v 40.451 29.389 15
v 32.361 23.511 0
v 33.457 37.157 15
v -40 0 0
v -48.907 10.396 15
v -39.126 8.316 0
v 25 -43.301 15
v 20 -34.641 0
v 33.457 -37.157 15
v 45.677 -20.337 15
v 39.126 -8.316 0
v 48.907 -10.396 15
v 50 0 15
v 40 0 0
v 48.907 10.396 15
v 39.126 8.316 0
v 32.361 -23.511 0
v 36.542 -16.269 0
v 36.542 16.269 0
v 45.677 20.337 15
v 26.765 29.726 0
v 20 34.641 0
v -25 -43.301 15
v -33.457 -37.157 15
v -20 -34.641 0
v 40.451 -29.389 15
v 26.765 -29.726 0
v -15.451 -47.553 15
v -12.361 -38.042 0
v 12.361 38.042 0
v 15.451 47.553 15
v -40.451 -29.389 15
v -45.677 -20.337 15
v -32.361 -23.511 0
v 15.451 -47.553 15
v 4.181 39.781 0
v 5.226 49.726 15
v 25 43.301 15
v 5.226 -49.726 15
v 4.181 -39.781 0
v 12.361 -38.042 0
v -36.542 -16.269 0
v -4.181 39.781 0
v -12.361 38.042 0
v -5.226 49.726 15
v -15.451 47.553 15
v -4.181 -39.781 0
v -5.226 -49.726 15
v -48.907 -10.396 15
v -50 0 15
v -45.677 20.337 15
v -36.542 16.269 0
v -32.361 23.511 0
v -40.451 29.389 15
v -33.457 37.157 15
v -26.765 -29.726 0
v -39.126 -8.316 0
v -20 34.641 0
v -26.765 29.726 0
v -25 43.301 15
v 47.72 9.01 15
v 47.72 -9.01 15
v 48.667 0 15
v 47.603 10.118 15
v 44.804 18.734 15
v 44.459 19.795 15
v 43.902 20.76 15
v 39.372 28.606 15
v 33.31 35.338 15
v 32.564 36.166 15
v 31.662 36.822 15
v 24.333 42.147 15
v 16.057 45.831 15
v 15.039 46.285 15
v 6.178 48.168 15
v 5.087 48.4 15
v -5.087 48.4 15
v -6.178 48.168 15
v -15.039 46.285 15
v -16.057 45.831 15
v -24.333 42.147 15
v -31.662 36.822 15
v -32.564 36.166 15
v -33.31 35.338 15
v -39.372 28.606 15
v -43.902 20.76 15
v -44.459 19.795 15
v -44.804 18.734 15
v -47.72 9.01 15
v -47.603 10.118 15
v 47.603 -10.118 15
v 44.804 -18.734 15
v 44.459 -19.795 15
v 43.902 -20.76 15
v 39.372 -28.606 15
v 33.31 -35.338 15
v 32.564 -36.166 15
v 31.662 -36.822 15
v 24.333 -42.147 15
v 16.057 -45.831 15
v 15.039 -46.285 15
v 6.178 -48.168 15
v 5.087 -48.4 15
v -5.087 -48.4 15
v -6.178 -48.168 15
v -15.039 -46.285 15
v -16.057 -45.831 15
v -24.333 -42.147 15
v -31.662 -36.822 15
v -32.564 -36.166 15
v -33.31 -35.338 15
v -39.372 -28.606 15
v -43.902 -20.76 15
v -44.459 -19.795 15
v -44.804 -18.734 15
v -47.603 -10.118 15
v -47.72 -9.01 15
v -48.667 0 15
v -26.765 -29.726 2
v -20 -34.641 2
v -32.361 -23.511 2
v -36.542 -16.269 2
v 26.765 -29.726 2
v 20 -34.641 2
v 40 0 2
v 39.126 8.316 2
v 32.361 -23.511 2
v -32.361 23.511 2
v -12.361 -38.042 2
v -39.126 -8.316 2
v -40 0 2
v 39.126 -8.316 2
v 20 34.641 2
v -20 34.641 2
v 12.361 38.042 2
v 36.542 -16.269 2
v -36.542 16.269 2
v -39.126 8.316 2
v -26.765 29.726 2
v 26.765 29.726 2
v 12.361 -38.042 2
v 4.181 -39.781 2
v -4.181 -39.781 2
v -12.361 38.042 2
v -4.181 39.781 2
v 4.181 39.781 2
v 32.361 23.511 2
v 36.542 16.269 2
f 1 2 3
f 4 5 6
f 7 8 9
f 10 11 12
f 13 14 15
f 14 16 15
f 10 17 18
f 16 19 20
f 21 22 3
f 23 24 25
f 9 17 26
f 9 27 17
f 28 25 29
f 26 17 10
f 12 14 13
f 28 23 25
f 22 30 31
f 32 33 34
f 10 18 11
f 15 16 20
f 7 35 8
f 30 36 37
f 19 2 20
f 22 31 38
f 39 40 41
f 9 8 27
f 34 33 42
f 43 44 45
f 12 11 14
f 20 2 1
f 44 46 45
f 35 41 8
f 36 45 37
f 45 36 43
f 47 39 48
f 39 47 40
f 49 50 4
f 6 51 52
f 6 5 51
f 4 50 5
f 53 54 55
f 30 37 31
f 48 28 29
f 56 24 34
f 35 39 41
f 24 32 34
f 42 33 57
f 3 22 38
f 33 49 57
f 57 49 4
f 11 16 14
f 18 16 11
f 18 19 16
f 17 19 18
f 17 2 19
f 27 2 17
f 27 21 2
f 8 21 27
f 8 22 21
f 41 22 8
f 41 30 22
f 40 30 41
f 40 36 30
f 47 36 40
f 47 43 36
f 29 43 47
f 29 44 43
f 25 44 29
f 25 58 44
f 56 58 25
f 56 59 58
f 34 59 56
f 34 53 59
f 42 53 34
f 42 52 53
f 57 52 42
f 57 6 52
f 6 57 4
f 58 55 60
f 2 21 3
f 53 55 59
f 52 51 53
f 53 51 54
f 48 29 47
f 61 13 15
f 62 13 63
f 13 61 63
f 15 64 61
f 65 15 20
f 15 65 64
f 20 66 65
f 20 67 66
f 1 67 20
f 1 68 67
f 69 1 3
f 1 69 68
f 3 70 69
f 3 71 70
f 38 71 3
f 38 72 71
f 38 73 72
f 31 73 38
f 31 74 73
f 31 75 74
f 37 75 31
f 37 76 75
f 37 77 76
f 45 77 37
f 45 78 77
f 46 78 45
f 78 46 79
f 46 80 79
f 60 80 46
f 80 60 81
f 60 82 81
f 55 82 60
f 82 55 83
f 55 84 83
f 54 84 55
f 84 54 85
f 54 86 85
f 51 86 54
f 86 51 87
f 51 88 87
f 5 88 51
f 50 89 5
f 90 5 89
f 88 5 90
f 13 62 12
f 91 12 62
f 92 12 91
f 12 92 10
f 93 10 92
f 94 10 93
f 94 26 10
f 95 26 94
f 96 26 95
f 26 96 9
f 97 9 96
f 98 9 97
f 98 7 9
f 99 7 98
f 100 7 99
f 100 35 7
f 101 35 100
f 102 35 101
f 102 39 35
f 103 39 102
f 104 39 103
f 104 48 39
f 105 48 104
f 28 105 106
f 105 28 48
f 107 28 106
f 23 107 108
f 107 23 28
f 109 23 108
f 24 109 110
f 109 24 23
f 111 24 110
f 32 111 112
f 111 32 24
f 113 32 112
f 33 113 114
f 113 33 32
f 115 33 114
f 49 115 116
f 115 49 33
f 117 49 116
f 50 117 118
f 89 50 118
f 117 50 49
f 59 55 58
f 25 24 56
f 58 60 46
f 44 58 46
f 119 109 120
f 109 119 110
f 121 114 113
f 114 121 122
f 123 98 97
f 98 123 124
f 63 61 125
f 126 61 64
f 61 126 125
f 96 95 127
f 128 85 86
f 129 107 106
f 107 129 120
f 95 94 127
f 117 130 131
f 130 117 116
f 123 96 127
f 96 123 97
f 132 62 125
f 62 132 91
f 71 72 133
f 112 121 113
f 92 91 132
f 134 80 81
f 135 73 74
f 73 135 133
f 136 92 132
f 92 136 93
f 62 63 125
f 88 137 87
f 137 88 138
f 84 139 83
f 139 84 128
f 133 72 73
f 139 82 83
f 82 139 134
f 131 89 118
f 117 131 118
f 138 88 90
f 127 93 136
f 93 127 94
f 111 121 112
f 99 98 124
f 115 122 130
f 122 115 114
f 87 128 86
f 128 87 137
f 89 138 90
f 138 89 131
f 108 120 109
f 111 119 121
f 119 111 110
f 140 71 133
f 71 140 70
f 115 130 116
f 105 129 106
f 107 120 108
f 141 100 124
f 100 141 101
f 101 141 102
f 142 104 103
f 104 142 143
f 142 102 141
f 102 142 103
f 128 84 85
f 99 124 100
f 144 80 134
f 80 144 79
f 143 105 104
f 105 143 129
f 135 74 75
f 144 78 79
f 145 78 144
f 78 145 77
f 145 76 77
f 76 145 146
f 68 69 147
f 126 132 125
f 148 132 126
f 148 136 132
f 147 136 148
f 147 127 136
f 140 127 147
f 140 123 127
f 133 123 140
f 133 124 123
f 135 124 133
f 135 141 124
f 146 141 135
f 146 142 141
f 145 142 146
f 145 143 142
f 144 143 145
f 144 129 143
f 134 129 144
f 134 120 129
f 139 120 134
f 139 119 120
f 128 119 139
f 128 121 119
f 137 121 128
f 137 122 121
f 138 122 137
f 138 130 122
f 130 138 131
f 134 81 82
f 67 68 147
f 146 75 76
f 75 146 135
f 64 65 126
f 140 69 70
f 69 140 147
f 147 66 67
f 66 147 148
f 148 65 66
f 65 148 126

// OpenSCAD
difference(){
    cylinder(h = 15, r1 = 40, r2 = 50);
    translate([0, 0, 2]){
        cylinder(h = 15, r1 = 40, r2 = 50);
    }
};
